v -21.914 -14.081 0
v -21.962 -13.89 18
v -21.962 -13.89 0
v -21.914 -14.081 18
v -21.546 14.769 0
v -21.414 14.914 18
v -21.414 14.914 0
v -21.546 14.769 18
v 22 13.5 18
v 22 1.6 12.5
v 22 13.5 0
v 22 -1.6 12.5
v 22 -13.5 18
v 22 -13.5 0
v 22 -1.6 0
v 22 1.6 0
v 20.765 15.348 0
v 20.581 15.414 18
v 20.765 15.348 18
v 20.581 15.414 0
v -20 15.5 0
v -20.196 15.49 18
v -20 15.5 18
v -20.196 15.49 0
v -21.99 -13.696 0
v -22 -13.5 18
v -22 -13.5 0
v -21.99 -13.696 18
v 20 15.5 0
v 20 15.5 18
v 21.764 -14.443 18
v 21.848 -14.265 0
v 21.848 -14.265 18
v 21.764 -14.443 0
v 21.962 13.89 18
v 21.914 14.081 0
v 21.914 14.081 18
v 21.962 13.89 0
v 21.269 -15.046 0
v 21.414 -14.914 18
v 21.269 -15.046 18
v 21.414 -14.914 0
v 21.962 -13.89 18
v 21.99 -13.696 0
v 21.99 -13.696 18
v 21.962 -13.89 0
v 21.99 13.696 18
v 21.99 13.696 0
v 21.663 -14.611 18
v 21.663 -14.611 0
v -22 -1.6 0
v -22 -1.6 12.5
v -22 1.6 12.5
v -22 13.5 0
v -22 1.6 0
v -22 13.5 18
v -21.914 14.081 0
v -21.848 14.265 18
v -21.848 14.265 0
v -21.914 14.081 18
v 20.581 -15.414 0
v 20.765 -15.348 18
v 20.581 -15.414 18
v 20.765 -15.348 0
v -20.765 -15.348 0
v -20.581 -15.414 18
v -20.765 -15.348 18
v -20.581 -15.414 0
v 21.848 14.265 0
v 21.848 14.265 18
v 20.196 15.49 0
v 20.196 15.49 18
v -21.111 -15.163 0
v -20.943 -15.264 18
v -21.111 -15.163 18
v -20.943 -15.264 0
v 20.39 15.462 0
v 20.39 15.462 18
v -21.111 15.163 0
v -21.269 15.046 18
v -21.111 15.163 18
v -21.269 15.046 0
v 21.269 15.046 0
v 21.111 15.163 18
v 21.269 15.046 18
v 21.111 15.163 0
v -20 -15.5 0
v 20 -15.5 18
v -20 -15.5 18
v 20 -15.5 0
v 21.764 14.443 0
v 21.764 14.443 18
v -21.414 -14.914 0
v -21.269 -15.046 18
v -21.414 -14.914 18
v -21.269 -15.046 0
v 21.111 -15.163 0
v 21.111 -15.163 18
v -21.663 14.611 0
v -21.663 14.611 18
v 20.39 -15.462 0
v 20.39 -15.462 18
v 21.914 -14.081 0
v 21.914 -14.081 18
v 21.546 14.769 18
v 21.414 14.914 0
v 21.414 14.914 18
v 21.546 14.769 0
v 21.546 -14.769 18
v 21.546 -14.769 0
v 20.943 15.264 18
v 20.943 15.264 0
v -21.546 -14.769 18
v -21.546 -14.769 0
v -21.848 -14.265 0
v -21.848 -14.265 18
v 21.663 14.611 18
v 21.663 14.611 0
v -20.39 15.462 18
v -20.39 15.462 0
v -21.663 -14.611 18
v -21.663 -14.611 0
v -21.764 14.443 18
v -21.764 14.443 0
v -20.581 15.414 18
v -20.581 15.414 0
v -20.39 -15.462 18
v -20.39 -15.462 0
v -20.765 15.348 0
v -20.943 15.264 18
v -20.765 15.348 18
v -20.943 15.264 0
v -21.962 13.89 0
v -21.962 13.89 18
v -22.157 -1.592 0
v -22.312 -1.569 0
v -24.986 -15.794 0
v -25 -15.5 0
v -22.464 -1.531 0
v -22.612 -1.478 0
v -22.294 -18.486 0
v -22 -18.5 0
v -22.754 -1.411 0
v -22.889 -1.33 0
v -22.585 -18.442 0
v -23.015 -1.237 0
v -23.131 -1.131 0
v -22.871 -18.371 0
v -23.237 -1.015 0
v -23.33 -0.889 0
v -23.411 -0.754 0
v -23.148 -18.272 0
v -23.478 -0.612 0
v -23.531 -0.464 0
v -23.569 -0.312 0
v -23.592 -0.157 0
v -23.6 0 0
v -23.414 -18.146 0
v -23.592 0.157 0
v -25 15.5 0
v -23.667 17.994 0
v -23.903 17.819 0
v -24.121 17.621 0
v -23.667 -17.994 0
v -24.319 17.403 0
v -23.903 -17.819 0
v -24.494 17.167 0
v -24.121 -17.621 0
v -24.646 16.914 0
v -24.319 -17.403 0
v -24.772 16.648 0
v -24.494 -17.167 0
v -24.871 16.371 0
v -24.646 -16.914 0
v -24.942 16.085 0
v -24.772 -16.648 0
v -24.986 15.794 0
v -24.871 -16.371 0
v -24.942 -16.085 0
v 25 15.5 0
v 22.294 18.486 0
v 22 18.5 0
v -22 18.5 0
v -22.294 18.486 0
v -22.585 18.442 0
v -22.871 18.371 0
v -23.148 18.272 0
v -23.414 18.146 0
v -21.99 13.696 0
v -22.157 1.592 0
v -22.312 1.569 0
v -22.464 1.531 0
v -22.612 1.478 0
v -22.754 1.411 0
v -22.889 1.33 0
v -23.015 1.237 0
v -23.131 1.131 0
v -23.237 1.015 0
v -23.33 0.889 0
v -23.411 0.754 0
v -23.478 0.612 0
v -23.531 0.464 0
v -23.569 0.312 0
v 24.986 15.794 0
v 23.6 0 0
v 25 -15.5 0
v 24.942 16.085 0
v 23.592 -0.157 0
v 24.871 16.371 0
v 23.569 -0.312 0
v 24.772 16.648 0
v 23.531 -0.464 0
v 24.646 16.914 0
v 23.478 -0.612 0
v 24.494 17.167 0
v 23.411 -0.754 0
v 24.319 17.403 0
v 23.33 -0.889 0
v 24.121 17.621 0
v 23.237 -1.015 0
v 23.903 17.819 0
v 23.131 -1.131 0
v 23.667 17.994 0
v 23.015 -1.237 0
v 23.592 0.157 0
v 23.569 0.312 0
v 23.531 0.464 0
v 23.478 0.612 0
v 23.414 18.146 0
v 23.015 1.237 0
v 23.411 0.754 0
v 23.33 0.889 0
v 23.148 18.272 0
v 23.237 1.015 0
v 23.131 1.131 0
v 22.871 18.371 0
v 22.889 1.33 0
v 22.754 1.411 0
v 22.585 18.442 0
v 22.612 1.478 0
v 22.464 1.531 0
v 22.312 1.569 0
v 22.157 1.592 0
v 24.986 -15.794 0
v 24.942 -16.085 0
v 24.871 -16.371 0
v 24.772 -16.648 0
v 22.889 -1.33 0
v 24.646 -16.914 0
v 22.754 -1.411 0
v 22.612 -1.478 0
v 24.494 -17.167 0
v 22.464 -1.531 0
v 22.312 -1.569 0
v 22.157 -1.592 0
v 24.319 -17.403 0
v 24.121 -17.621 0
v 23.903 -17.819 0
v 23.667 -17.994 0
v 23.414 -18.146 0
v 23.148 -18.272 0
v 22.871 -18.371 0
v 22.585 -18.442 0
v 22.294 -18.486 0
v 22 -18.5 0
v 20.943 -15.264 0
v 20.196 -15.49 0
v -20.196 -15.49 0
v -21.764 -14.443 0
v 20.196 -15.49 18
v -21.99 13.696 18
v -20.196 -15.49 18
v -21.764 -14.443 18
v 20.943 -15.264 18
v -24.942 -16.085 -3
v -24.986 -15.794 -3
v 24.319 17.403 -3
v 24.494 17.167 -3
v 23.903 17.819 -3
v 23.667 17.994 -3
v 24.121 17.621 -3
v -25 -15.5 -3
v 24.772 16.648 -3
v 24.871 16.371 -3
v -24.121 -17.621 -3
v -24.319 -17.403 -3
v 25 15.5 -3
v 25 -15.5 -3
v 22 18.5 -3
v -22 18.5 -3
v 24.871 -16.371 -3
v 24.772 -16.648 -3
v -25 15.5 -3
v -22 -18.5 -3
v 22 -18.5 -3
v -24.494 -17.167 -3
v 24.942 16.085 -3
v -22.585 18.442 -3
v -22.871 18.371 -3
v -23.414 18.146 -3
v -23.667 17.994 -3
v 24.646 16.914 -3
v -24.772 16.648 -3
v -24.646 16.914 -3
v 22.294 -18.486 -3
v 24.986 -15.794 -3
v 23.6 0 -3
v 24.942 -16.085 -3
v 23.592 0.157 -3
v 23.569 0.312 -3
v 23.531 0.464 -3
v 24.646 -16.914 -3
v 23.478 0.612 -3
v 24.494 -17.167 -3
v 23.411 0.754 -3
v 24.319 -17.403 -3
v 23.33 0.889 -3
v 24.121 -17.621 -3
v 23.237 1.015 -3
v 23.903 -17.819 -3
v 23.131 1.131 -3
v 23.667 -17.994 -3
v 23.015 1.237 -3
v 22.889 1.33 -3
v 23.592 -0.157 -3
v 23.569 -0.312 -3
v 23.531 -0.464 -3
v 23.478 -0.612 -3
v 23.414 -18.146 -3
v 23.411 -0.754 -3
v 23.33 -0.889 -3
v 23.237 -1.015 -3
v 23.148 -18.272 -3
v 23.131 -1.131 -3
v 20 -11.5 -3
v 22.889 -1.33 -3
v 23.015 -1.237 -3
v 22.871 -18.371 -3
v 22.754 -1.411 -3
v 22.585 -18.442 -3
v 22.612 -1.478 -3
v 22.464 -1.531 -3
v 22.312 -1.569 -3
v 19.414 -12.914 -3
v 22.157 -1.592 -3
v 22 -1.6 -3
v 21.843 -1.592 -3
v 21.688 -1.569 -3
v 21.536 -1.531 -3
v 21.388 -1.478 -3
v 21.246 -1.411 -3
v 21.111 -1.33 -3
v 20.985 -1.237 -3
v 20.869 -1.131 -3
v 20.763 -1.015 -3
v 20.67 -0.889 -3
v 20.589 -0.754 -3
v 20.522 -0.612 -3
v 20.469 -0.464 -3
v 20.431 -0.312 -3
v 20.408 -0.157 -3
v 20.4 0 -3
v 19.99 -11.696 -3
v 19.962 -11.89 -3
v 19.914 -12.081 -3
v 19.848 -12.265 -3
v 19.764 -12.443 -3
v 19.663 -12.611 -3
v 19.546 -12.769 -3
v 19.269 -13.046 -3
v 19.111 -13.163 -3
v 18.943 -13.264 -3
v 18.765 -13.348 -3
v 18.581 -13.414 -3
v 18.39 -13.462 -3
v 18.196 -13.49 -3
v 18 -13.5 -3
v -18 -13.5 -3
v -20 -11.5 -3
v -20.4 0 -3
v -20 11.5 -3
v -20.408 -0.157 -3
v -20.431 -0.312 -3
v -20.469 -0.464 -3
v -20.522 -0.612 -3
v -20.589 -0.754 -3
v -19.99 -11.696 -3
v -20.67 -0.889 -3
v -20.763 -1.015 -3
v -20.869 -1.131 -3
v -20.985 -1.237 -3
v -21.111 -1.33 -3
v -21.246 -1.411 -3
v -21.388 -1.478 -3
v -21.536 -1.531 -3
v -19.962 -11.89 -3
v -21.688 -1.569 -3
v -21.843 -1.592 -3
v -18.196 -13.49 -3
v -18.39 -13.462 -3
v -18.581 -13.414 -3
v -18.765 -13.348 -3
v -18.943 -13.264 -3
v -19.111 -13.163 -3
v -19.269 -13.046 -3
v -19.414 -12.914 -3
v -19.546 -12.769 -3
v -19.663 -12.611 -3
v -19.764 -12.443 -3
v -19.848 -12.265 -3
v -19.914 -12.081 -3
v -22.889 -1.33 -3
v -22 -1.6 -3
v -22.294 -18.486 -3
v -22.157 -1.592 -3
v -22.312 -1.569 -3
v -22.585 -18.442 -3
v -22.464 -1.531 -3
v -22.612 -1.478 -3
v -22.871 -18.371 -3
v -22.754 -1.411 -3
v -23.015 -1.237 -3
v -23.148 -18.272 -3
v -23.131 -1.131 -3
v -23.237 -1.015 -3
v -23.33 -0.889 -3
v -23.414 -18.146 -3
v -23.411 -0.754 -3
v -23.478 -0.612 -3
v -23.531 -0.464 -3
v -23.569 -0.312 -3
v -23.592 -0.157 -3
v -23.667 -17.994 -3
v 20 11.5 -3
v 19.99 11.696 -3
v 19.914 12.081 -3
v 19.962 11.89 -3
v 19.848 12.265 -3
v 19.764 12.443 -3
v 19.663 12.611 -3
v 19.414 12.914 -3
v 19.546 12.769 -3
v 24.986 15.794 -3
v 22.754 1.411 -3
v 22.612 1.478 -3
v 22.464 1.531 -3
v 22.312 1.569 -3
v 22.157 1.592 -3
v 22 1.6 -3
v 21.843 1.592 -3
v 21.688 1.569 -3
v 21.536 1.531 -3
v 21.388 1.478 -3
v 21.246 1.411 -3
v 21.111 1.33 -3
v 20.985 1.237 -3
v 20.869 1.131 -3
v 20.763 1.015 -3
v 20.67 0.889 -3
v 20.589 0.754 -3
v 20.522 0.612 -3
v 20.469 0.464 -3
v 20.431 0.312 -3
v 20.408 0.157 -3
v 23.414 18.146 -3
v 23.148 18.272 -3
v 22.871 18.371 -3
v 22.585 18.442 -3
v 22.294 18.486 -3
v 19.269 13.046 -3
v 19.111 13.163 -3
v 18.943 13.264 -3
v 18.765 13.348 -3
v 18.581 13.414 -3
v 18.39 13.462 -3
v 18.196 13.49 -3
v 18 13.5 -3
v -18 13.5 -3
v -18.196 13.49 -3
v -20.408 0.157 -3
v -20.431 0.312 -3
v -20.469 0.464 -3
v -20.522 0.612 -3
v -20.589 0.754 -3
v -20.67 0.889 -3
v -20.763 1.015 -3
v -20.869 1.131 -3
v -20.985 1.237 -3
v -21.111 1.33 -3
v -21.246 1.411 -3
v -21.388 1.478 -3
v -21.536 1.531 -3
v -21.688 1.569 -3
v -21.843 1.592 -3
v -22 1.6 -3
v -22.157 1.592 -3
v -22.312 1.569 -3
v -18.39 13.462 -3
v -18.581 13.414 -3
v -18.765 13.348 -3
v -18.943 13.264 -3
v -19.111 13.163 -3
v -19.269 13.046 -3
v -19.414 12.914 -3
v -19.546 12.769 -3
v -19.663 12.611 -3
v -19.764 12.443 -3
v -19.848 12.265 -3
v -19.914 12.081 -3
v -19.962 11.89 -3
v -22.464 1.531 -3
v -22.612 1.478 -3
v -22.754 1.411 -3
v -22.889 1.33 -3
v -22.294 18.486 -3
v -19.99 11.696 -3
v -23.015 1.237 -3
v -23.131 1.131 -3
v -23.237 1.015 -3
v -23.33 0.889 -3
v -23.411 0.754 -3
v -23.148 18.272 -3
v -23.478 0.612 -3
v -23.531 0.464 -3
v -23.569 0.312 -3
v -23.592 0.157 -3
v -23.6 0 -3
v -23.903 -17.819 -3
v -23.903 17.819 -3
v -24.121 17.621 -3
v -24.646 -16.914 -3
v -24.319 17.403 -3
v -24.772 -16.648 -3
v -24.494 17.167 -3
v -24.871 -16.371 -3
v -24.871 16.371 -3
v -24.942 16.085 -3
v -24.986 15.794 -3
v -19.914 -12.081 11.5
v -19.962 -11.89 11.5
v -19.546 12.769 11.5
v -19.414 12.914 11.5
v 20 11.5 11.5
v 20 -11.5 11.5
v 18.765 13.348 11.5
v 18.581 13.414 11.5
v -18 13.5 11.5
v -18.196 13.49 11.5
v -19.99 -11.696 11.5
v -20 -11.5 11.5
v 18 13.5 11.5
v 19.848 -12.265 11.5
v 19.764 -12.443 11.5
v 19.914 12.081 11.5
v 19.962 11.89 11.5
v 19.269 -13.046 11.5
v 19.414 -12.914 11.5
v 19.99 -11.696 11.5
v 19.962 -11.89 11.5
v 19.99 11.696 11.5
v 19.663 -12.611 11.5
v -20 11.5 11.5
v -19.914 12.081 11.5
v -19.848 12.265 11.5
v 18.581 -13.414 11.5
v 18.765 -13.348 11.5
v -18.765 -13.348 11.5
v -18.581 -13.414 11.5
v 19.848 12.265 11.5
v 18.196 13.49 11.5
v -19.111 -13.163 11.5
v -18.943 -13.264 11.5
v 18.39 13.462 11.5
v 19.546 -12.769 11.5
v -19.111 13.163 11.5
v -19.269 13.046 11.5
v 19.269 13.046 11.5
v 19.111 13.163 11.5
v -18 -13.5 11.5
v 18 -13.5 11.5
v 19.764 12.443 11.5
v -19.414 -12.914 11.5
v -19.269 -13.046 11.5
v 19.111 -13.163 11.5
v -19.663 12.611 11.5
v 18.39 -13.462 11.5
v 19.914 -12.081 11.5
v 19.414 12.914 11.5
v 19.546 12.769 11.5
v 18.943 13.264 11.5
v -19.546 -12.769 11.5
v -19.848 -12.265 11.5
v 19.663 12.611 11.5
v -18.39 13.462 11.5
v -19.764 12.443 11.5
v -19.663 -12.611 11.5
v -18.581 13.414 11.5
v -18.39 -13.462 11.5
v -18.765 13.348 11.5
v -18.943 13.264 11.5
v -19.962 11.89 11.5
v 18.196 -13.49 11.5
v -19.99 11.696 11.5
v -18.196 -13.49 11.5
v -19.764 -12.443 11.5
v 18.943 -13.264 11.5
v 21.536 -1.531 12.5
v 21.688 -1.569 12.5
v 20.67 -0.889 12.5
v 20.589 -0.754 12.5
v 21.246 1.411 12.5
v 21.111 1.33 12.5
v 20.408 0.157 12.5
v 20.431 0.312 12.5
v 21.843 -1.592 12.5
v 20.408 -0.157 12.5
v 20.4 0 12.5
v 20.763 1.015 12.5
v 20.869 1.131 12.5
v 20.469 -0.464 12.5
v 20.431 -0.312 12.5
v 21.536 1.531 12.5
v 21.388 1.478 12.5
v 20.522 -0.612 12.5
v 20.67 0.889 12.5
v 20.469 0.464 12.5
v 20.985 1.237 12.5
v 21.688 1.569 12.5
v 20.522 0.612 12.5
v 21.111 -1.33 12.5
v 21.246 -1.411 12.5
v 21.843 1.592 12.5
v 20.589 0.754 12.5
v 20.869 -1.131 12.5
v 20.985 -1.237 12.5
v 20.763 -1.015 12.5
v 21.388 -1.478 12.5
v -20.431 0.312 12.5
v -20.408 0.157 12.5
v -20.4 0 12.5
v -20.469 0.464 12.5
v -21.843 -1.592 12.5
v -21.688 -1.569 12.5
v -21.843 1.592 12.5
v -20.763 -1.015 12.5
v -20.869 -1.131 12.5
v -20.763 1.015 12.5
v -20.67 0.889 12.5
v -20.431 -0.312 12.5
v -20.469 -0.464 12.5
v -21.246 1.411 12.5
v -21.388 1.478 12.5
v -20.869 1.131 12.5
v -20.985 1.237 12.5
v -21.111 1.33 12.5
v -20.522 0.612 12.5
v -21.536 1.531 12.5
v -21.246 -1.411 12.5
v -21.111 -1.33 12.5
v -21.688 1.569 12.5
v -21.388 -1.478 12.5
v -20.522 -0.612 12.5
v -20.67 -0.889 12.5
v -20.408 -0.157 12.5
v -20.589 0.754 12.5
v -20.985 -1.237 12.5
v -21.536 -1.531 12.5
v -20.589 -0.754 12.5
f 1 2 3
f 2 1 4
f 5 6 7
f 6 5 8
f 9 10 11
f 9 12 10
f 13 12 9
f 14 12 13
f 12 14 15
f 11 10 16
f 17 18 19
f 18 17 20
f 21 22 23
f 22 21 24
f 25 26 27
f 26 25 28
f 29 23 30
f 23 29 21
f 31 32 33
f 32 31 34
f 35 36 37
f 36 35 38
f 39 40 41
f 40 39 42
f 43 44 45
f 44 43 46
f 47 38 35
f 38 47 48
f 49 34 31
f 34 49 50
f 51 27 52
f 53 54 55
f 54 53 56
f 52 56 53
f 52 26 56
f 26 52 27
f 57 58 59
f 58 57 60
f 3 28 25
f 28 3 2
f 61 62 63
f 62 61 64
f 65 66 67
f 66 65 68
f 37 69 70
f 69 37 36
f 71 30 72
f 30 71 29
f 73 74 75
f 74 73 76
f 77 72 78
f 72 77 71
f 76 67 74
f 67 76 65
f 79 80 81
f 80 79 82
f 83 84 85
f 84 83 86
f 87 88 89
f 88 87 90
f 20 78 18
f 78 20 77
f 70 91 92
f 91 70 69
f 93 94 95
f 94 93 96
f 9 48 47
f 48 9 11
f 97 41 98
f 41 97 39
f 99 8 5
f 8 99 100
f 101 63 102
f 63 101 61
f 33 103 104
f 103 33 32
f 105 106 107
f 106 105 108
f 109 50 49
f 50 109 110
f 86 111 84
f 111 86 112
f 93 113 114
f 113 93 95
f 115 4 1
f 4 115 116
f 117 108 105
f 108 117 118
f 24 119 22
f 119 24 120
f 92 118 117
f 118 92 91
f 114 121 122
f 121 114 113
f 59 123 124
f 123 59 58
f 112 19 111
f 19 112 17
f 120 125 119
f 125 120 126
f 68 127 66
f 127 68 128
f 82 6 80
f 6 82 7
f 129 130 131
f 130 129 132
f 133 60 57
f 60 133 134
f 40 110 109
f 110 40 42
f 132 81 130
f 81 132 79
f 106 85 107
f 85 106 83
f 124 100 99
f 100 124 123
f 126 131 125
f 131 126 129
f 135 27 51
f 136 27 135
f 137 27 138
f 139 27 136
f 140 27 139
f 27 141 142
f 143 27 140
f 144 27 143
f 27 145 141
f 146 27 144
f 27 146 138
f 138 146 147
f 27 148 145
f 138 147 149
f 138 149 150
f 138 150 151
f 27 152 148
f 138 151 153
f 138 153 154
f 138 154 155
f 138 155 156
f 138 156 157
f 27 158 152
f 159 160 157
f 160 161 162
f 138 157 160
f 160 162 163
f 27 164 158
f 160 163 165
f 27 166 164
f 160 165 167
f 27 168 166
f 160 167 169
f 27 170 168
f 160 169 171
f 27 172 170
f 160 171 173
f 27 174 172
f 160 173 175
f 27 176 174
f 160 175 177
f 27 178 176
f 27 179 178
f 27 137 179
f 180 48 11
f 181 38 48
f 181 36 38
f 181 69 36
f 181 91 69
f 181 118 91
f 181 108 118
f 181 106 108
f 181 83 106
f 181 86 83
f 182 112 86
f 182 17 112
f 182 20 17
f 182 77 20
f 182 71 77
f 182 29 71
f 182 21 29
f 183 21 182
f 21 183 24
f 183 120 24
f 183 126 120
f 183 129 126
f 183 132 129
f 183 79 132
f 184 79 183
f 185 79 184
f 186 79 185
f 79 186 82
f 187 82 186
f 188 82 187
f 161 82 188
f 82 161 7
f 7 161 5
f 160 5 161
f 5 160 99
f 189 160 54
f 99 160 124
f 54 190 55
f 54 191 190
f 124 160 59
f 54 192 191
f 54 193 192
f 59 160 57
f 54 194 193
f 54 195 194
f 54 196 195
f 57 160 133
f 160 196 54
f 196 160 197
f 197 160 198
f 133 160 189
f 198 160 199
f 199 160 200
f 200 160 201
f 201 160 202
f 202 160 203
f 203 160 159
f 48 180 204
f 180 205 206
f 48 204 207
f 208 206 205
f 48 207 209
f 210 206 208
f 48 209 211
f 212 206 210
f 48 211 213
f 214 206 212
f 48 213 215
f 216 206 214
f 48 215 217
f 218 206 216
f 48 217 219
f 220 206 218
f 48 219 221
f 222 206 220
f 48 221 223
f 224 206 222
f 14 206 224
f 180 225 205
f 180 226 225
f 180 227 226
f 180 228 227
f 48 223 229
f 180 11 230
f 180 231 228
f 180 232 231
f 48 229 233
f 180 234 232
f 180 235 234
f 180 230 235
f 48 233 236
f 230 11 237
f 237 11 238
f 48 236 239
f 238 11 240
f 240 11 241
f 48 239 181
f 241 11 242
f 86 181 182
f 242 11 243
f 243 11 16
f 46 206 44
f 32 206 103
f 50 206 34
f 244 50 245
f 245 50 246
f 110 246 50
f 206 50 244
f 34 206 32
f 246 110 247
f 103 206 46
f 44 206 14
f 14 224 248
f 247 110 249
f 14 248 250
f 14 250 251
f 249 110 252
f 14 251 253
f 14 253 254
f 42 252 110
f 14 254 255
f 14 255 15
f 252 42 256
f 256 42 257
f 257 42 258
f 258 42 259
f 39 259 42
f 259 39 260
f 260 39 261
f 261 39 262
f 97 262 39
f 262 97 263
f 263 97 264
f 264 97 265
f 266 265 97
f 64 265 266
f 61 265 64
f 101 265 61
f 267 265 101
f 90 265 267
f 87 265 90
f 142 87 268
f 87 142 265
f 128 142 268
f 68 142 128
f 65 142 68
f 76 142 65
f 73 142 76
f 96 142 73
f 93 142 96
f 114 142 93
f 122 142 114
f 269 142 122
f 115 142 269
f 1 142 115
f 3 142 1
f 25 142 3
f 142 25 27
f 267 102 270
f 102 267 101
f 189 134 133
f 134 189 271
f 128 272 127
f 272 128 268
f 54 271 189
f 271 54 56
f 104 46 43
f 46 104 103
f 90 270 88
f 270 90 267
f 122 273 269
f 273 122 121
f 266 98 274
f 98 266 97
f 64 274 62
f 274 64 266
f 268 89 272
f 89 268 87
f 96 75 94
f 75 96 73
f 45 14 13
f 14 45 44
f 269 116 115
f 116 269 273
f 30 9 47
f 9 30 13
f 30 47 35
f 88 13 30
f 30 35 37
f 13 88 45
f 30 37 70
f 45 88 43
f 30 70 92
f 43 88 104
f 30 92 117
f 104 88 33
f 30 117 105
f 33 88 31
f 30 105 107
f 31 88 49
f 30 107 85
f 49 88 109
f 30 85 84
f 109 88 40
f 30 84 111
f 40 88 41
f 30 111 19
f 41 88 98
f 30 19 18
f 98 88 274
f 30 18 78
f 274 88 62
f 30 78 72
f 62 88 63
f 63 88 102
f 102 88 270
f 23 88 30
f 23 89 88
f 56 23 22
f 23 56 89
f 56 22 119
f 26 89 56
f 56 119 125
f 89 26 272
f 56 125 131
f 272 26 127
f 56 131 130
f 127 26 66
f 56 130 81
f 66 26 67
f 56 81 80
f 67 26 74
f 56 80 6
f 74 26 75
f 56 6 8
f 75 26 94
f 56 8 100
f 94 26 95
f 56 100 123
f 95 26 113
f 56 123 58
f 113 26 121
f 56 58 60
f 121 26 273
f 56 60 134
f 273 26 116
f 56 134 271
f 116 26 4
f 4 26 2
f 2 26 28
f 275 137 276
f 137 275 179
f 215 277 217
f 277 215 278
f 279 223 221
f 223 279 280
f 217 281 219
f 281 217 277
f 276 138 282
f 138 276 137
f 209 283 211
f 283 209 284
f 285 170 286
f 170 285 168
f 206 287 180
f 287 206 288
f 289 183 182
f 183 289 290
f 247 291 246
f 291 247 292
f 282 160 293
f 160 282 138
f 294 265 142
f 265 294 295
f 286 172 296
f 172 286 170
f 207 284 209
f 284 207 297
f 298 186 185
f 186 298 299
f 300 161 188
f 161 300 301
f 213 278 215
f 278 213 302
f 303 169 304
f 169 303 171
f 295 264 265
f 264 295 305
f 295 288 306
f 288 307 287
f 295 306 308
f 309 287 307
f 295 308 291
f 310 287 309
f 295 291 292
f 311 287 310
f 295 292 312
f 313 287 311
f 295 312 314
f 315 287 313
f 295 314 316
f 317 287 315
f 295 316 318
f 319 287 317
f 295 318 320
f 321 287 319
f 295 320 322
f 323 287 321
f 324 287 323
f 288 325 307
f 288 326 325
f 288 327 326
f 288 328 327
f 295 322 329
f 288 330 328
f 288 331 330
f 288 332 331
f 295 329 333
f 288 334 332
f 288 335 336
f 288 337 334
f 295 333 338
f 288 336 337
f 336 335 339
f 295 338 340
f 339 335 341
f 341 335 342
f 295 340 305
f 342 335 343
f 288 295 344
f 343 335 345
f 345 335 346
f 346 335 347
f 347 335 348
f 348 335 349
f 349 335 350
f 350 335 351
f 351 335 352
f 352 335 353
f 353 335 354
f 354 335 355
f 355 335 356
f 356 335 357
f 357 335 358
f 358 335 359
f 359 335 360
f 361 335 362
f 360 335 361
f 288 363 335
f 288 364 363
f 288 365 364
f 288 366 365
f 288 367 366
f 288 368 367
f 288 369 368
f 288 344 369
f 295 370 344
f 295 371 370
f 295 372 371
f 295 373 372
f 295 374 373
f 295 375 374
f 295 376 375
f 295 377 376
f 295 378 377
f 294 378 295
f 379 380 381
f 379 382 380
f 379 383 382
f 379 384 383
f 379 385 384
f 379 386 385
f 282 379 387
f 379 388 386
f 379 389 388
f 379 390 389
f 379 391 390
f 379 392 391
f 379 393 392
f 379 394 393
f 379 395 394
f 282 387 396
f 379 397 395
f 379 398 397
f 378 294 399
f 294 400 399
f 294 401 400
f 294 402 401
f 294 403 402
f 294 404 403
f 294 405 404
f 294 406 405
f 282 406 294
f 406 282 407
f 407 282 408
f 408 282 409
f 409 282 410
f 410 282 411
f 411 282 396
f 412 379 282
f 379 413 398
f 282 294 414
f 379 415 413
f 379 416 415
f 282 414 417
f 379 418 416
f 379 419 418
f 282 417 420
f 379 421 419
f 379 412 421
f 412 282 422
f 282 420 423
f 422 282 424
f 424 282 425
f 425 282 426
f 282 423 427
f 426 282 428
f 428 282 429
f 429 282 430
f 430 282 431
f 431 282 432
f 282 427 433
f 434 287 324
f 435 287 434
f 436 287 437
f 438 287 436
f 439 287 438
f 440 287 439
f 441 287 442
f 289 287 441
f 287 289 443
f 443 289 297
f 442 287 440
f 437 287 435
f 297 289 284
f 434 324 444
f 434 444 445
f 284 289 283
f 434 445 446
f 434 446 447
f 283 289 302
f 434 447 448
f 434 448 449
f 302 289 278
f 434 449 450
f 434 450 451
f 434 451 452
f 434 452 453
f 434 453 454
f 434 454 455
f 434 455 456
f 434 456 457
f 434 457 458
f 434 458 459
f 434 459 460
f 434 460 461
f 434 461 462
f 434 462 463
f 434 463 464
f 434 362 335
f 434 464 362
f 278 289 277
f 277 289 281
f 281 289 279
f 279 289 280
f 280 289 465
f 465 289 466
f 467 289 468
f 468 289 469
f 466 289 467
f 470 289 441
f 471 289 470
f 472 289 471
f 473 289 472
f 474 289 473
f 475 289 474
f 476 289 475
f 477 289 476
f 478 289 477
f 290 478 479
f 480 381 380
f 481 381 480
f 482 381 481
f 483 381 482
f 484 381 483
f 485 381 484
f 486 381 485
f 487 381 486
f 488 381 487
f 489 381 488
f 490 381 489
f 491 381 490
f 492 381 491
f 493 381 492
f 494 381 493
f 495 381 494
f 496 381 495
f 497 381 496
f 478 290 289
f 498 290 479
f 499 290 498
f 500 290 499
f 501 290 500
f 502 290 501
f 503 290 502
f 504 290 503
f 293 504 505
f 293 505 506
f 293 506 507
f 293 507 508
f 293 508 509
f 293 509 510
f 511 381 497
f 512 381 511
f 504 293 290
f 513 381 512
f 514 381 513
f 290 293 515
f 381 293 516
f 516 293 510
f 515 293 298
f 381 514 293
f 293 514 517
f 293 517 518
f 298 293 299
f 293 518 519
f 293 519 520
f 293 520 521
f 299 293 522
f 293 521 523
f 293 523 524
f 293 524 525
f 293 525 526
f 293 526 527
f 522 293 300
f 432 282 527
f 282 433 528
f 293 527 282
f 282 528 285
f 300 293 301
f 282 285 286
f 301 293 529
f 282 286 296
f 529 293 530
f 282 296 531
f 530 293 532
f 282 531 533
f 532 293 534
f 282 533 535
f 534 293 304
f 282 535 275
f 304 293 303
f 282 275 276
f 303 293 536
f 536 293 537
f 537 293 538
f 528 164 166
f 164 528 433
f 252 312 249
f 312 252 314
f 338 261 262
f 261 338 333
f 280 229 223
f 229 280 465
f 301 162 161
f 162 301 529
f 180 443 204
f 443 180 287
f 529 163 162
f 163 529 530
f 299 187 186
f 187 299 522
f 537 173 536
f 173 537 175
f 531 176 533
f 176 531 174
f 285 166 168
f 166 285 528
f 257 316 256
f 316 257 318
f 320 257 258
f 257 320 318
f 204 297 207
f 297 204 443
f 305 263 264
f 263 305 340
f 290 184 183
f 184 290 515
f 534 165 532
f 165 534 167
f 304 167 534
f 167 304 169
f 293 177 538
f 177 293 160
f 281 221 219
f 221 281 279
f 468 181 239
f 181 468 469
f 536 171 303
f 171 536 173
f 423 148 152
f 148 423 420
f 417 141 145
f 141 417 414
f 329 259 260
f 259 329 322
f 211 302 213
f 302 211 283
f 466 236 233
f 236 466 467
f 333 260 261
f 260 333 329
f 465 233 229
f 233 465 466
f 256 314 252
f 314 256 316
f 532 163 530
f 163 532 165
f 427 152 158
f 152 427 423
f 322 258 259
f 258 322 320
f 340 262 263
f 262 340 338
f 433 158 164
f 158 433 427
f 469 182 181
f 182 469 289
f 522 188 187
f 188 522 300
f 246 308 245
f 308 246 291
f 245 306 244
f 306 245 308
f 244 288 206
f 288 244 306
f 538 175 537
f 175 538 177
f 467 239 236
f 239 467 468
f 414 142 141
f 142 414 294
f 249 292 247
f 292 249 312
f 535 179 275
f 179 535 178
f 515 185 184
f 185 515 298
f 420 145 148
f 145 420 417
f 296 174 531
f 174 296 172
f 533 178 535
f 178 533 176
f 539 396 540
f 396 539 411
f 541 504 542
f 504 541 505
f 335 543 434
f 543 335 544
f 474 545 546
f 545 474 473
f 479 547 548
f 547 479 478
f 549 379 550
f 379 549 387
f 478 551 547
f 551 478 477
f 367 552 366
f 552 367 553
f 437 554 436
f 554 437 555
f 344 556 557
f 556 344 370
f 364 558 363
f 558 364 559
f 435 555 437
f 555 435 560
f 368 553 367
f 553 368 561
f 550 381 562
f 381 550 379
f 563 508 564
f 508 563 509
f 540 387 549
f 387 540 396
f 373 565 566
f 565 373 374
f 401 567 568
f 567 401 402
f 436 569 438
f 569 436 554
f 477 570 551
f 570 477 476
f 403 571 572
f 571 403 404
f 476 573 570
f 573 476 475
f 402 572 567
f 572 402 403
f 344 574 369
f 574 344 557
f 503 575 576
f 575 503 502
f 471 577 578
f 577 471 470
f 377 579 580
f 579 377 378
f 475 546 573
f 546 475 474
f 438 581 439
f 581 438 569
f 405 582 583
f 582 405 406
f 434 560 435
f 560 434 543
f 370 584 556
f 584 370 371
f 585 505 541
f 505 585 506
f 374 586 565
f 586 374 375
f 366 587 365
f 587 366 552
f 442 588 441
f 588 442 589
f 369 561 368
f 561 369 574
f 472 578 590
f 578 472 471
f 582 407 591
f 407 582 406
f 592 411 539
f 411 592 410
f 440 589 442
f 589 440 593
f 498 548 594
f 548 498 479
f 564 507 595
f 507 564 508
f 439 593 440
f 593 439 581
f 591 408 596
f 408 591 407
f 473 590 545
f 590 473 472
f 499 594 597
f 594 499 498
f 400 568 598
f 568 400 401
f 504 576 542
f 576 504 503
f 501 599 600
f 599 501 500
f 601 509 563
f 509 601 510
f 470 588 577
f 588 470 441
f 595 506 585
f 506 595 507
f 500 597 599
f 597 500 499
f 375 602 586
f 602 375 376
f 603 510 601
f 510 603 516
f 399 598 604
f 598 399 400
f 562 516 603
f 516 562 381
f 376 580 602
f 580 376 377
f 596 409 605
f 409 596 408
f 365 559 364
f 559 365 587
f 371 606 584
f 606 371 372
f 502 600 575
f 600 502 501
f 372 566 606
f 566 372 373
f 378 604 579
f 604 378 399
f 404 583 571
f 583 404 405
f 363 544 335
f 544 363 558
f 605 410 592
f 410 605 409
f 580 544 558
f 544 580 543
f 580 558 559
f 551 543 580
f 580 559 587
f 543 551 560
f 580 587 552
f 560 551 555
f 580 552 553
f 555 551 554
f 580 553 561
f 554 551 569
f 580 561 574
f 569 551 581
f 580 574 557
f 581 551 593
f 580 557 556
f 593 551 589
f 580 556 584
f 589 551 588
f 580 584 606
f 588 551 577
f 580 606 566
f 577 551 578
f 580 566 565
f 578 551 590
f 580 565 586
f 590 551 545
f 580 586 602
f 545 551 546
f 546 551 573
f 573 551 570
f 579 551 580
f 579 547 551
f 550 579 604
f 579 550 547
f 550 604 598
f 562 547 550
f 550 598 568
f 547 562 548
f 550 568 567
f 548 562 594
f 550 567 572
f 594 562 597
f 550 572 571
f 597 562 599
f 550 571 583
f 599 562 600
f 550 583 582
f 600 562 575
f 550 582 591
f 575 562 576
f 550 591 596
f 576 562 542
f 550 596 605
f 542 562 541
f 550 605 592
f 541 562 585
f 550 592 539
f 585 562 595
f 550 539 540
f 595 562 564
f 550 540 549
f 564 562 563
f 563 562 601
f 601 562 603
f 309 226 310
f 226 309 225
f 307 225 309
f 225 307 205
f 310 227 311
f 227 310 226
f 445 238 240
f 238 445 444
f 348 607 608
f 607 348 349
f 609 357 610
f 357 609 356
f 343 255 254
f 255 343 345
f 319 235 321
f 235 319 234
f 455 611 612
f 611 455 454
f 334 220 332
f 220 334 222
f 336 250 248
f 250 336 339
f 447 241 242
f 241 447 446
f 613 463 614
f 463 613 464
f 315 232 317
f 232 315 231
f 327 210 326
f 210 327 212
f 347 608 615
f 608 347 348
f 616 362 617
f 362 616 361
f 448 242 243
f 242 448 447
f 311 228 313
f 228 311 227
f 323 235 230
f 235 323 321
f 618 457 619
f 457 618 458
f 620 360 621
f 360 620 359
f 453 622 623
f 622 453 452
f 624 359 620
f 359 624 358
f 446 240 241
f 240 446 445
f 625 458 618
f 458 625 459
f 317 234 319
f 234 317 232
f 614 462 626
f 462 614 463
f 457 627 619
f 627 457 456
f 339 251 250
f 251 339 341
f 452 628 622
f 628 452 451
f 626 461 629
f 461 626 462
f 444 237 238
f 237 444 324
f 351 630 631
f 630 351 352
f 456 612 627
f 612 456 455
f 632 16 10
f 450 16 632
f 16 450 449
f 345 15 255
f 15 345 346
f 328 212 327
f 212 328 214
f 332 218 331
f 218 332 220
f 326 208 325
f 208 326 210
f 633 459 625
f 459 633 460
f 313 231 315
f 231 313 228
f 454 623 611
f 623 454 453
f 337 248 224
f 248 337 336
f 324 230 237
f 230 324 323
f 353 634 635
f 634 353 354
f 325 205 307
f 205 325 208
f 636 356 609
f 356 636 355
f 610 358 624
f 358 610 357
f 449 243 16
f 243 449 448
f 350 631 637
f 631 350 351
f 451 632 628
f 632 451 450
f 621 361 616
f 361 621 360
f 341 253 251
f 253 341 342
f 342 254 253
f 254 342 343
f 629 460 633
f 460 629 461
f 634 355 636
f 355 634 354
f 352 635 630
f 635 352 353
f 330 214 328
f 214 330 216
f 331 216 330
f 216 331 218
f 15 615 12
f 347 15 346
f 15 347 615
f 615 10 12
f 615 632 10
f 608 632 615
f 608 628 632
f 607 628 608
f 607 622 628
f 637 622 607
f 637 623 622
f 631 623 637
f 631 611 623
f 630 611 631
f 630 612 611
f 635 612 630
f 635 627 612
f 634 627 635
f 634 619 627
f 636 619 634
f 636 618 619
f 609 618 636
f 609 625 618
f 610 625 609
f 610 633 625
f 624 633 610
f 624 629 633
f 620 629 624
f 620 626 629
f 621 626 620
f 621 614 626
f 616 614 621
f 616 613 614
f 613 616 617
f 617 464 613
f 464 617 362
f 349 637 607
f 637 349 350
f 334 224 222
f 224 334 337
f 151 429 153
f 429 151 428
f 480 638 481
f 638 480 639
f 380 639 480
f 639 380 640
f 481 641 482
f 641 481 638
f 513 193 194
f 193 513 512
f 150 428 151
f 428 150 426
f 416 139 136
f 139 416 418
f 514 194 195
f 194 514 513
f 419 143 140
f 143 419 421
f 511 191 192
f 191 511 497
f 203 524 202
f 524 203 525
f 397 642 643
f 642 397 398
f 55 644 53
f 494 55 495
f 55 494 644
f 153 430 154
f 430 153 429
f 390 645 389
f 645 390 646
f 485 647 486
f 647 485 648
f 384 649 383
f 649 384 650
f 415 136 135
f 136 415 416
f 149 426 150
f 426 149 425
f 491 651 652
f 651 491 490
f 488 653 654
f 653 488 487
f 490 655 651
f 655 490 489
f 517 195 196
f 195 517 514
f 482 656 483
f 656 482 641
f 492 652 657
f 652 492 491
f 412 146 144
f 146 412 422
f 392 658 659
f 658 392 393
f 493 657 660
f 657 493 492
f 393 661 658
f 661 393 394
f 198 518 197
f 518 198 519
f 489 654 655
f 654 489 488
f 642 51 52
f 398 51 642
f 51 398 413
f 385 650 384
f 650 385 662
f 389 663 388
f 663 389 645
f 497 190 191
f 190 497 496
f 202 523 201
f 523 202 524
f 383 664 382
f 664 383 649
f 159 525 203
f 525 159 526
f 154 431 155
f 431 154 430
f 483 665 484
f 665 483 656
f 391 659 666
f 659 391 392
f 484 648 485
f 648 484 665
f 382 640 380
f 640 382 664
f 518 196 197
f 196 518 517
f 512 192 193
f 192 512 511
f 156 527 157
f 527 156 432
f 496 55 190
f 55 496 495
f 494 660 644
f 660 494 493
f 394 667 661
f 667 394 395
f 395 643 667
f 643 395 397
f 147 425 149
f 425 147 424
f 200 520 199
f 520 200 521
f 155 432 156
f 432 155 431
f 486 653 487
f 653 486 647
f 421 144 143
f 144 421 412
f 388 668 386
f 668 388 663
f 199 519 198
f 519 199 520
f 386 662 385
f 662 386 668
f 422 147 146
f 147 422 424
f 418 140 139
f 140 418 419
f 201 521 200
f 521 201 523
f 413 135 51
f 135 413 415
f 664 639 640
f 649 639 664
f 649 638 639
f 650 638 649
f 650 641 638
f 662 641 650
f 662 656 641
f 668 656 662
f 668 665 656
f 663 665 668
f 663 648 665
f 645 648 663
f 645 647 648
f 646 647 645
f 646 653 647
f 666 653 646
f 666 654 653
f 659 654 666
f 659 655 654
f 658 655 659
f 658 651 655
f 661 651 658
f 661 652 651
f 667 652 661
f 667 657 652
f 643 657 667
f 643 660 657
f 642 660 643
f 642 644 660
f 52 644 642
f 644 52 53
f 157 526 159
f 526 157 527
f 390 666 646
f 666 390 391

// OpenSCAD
$fn=64;

module rounded_rect_2d(w, h, r) {
    r2 = min(r, min(w, h)/2);
    hull() {
        translate([ w/2 - r2,  h/2 - r2]) circle(r=r2);
        translate([-w/2 + r2,  h/2 - r2]) circle(r=r2);
        translate([-w/2 + r2, -h/2 + r2]) circle(r=r2);
        translate([ w/2 - r2, -h/2 + r2]) circle(r=r2);
    }
}

module iec_inlet_cutout(w=40.0, h=27.0, depth=20.0, corner_r=2.0) {
    linear_extrude(height=depth, center=true)
        rounded_rect_2d(w, h, corner_r);
}

module screw_hole(d=3.2, depth=20.0) {
    cylinder(d=d, h=depth, center=true);
}

module iec_inlet_module() {
    cut_w = 40.0;
    cut_h = 27.0;
    depth = 20.0;

    flange_w = 50.0;
    flange_h = 37.0;
    flange_t = 3.0;
    flange_r = 3.0;

    body_w = 44.0;
    body_h = 31.0;
    body_t = 18.0;
    body_r = 2.0;

    hole_d = 3.2;
    hole_x = 22.0;
    hole_y = 0.0;

    difference() {
        union() {
            translate([0,0, body_t/2])
                linear_extrude(height=body_t, center=true)
                    rounded_rect_2d(body_w, body_h, body_r);

            translate([0,0, -flange_t/2])
                linear_extrude(height=flange_t, center=true)
                    rounded_rect_2d(flange_w, flange_h, flange_r);
        }

        iec_inlet_cutout(cut_w, cut_h, depth=body_t + flange_t + 2, corner_r=2.0);

        translate([ hole_x, hole_y, 0])
            screw_hole(d=hole_d, depth=body_t + flange_t + 4);

        translate([-hole_x, hole_y, 0])
            screw_hole(d=hole_d, depth=body_t + flange_t + 4);
    }
}

iec_inlet_module();
